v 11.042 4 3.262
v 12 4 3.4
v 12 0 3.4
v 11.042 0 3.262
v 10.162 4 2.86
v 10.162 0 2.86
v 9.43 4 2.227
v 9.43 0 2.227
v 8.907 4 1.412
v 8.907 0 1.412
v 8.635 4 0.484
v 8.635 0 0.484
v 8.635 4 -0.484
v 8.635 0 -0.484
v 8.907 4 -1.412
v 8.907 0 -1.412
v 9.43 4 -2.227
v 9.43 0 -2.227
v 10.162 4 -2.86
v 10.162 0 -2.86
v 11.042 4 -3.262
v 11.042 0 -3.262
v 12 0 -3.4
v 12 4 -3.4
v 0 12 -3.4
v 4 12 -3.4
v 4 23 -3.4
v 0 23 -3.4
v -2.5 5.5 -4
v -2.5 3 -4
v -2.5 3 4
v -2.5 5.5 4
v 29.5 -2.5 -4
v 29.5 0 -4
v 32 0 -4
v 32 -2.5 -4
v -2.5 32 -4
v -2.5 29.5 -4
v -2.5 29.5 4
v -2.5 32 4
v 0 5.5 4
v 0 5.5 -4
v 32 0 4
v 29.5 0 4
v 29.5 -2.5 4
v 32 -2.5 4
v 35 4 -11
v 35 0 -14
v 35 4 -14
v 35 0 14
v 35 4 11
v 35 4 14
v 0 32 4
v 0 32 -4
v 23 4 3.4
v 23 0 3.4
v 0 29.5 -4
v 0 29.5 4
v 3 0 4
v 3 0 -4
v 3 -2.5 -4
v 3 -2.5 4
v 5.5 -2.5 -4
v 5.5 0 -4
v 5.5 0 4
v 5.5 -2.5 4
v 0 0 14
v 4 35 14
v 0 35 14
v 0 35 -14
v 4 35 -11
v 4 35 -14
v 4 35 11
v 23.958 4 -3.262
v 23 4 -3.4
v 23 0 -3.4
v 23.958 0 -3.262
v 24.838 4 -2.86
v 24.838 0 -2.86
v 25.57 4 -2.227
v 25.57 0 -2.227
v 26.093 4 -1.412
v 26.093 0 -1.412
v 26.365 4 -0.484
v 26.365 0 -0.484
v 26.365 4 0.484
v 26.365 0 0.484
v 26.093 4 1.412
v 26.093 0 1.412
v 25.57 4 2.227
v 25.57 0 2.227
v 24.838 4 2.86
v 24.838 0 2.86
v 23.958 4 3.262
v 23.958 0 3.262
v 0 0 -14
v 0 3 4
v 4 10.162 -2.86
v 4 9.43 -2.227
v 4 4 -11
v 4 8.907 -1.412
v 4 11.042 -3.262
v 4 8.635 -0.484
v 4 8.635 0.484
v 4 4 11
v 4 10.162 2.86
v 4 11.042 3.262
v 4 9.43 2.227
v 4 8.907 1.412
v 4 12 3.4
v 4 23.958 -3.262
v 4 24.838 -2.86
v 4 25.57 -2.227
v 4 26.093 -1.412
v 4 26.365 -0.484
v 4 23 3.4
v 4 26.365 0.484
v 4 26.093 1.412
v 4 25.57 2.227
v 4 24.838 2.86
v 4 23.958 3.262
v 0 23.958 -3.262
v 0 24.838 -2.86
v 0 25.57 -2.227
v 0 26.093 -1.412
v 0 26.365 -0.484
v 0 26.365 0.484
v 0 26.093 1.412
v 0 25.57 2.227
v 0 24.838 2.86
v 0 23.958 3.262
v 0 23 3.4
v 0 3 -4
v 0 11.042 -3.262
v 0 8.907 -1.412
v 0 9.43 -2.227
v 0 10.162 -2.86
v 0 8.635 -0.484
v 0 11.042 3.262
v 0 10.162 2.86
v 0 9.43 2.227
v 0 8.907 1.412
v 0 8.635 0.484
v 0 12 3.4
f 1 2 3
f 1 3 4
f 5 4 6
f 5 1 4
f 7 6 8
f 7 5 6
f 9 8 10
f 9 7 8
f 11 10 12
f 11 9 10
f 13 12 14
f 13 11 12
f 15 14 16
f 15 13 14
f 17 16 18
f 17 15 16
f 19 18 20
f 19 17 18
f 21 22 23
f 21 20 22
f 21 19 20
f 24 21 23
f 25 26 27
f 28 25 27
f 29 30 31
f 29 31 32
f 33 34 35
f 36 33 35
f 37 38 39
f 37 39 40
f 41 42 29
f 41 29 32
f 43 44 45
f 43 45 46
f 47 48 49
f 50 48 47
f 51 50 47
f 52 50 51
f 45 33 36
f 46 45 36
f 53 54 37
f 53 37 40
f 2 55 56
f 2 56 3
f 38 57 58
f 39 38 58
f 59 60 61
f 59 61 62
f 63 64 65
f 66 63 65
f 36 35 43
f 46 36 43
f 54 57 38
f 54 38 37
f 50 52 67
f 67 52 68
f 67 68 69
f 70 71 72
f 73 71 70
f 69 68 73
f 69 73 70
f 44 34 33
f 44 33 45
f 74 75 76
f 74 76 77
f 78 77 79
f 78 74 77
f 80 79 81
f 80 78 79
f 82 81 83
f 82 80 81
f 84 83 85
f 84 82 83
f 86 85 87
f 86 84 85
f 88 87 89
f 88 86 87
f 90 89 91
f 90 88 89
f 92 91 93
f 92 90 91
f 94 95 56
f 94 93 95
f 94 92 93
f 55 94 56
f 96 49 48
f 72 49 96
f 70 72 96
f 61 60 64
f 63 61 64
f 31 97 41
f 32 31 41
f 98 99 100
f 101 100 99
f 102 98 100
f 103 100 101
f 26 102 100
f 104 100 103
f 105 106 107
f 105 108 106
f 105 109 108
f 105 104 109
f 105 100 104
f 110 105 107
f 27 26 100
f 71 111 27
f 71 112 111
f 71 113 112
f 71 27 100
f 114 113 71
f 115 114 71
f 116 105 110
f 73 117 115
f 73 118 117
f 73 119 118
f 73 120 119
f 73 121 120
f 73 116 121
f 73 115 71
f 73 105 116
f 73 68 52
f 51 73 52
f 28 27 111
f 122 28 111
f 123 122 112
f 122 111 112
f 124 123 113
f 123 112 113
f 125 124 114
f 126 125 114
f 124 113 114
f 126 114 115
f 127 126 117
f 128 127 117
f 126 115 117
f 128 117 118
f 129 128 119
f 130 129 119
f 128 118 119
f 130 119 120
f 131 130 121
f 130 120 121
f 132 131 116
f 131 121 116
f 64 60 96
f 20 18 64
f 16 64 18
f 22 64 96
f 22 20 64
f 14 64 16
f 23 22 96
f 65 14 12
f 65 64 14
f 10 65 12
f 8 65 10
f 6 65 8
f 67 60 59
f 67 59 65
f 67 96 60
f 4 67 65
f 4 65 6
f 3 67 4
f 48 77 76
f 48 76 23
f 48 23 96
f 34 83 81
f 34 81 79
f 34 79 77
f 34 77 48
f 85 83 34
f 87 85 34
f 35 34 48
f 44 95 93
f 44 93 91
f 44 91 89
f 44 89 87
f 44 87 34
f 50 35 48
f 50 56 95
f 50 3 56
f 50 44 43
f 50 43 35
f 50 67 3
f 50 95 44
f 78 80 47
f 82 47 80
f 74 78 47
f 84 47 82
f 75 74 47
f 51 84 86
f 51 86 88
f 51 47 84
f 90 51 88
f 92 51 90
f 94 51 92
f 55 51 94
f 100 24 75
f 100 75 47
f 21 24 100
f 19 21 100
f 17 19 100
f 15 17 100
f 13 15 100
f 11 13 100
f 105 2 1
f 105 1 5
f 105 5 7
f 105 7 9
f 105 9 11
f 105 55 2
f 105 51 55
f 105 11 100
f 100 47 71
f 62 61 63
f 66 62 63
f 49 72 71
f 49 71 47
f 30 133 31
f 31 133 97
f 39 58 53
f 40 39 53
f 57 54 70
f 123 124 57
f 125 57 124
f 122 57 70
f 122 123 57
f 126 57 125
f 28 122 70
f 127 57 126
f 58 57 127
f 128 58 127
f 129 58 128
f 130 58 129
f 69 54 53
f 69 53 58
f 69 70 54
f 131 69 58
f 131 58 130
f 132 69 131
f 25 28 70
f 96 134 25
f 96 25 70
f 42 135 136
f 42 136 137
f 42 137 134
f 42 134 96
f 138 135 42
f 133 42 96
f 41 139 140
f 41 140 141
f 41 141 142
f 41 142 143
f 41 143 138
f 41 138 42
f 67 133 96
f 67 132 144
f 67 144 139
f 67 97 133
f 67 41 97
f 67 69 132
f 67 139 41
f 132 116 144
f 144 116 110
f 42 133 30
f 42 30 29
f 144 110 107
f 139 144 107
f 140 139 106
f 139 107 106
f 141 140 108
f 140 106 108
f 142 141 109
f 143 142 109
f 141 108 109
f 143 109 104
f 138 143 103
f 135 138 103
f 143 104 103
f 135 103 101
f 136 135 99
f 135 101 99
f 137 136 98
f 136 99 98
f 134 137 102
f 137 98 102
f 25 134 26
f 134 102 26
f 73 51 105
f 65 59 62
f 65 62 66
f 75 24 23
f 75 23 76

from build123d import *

# Parameters (mm, degrees)
EXTRUDE_1_DEPTH     = 14
EXTRUDE_2_DEPTH     = 3
CUT_EXTRUDE_1_DEPTH = 5
SKETCH_4_W          = 2.5
SKETCH_4_H          = 8
EXTRUDE_3_DEPTH     = 2.5


with BuildPart() as part:
    # Эскиз1 → Бобышка-Вытянуть1 (new body, symmetric)
    with BuildSketch(Plane.XY):
        Polygon((0, 35), (0, 0), (35, 0), (35, 4), (4, 4), (4, 35), align=None)
    extrude(amount=EXTRUDE_1_DEPTH, both=True)

    # Эскиз2 → Бобышка-Вытянуть2 (add)
    with BuildSketch(Plane.XY.offset(14)):
        Polygon((4, 35), (35, 4), (4, 4), align=None)
    extrude_2 = extrude(amount=-EXTRUDE_2_DEPTH)

    # Зеркальное отражение2: Бобышка-Вытянуть2 across plane
    add(extrude_2.mirror(Plane.XY))

    # Эскиз3 → Вырез-Вытянуть1 (cut, through all)
    with BuildSketch(Plane(origin=(0, 4, 0), x_dir=(1, 0, 0), z_dir=(0, 1, 0))):
        with BuildLine():
            Line((12, 3.4), (23, 3.4))
            ThreePointArc((23, 3.4), (26.4, 0), (23, -3.4))
            Line((23, -3.4), (12, -3.4))
            ThreePointArc((12, -3.4), (8.6, 0), (12, 3.4))
        make_face()
    cut_extrude_1 = extrude(amount=-CUT_EXTRUDE_1_DEPTH, mode=Mode.SUBTRACT)

    # Эскиз4 → Бобышка-Вытянуть3 (add)
    with BuildSketch(Plane.XZ):
        with Locations((4.25, 0)):
            Rectangle(SKETCH_4_W, SKETCH_4_H)
        with Locations((30.75, 0)):
            Rectangle(SKETCH_4_W, SKETCH_4_H)
    extrude_3 = extrude(amount=EXTRUDE_3_DEPTH)

    # Зеркальное отражение3: Вырез-Вытянуть1, Бобышка-Вытянуть3 across plane
    add(cut_extrude_1.mirror(Plane(origin=(0, 0, 0), x_dir=(0, 0, 1), z_dir=(-0.707106781, 0.707106781, 0))), mode=Mode.SUBTRACT)
    add(extrude_3.mirror(Plane(origin=(0, 0, 0), x_dir=(0, 0, 1), z_dir=(-0.707106781, 0.707106781, 0))))


solid = part.part
